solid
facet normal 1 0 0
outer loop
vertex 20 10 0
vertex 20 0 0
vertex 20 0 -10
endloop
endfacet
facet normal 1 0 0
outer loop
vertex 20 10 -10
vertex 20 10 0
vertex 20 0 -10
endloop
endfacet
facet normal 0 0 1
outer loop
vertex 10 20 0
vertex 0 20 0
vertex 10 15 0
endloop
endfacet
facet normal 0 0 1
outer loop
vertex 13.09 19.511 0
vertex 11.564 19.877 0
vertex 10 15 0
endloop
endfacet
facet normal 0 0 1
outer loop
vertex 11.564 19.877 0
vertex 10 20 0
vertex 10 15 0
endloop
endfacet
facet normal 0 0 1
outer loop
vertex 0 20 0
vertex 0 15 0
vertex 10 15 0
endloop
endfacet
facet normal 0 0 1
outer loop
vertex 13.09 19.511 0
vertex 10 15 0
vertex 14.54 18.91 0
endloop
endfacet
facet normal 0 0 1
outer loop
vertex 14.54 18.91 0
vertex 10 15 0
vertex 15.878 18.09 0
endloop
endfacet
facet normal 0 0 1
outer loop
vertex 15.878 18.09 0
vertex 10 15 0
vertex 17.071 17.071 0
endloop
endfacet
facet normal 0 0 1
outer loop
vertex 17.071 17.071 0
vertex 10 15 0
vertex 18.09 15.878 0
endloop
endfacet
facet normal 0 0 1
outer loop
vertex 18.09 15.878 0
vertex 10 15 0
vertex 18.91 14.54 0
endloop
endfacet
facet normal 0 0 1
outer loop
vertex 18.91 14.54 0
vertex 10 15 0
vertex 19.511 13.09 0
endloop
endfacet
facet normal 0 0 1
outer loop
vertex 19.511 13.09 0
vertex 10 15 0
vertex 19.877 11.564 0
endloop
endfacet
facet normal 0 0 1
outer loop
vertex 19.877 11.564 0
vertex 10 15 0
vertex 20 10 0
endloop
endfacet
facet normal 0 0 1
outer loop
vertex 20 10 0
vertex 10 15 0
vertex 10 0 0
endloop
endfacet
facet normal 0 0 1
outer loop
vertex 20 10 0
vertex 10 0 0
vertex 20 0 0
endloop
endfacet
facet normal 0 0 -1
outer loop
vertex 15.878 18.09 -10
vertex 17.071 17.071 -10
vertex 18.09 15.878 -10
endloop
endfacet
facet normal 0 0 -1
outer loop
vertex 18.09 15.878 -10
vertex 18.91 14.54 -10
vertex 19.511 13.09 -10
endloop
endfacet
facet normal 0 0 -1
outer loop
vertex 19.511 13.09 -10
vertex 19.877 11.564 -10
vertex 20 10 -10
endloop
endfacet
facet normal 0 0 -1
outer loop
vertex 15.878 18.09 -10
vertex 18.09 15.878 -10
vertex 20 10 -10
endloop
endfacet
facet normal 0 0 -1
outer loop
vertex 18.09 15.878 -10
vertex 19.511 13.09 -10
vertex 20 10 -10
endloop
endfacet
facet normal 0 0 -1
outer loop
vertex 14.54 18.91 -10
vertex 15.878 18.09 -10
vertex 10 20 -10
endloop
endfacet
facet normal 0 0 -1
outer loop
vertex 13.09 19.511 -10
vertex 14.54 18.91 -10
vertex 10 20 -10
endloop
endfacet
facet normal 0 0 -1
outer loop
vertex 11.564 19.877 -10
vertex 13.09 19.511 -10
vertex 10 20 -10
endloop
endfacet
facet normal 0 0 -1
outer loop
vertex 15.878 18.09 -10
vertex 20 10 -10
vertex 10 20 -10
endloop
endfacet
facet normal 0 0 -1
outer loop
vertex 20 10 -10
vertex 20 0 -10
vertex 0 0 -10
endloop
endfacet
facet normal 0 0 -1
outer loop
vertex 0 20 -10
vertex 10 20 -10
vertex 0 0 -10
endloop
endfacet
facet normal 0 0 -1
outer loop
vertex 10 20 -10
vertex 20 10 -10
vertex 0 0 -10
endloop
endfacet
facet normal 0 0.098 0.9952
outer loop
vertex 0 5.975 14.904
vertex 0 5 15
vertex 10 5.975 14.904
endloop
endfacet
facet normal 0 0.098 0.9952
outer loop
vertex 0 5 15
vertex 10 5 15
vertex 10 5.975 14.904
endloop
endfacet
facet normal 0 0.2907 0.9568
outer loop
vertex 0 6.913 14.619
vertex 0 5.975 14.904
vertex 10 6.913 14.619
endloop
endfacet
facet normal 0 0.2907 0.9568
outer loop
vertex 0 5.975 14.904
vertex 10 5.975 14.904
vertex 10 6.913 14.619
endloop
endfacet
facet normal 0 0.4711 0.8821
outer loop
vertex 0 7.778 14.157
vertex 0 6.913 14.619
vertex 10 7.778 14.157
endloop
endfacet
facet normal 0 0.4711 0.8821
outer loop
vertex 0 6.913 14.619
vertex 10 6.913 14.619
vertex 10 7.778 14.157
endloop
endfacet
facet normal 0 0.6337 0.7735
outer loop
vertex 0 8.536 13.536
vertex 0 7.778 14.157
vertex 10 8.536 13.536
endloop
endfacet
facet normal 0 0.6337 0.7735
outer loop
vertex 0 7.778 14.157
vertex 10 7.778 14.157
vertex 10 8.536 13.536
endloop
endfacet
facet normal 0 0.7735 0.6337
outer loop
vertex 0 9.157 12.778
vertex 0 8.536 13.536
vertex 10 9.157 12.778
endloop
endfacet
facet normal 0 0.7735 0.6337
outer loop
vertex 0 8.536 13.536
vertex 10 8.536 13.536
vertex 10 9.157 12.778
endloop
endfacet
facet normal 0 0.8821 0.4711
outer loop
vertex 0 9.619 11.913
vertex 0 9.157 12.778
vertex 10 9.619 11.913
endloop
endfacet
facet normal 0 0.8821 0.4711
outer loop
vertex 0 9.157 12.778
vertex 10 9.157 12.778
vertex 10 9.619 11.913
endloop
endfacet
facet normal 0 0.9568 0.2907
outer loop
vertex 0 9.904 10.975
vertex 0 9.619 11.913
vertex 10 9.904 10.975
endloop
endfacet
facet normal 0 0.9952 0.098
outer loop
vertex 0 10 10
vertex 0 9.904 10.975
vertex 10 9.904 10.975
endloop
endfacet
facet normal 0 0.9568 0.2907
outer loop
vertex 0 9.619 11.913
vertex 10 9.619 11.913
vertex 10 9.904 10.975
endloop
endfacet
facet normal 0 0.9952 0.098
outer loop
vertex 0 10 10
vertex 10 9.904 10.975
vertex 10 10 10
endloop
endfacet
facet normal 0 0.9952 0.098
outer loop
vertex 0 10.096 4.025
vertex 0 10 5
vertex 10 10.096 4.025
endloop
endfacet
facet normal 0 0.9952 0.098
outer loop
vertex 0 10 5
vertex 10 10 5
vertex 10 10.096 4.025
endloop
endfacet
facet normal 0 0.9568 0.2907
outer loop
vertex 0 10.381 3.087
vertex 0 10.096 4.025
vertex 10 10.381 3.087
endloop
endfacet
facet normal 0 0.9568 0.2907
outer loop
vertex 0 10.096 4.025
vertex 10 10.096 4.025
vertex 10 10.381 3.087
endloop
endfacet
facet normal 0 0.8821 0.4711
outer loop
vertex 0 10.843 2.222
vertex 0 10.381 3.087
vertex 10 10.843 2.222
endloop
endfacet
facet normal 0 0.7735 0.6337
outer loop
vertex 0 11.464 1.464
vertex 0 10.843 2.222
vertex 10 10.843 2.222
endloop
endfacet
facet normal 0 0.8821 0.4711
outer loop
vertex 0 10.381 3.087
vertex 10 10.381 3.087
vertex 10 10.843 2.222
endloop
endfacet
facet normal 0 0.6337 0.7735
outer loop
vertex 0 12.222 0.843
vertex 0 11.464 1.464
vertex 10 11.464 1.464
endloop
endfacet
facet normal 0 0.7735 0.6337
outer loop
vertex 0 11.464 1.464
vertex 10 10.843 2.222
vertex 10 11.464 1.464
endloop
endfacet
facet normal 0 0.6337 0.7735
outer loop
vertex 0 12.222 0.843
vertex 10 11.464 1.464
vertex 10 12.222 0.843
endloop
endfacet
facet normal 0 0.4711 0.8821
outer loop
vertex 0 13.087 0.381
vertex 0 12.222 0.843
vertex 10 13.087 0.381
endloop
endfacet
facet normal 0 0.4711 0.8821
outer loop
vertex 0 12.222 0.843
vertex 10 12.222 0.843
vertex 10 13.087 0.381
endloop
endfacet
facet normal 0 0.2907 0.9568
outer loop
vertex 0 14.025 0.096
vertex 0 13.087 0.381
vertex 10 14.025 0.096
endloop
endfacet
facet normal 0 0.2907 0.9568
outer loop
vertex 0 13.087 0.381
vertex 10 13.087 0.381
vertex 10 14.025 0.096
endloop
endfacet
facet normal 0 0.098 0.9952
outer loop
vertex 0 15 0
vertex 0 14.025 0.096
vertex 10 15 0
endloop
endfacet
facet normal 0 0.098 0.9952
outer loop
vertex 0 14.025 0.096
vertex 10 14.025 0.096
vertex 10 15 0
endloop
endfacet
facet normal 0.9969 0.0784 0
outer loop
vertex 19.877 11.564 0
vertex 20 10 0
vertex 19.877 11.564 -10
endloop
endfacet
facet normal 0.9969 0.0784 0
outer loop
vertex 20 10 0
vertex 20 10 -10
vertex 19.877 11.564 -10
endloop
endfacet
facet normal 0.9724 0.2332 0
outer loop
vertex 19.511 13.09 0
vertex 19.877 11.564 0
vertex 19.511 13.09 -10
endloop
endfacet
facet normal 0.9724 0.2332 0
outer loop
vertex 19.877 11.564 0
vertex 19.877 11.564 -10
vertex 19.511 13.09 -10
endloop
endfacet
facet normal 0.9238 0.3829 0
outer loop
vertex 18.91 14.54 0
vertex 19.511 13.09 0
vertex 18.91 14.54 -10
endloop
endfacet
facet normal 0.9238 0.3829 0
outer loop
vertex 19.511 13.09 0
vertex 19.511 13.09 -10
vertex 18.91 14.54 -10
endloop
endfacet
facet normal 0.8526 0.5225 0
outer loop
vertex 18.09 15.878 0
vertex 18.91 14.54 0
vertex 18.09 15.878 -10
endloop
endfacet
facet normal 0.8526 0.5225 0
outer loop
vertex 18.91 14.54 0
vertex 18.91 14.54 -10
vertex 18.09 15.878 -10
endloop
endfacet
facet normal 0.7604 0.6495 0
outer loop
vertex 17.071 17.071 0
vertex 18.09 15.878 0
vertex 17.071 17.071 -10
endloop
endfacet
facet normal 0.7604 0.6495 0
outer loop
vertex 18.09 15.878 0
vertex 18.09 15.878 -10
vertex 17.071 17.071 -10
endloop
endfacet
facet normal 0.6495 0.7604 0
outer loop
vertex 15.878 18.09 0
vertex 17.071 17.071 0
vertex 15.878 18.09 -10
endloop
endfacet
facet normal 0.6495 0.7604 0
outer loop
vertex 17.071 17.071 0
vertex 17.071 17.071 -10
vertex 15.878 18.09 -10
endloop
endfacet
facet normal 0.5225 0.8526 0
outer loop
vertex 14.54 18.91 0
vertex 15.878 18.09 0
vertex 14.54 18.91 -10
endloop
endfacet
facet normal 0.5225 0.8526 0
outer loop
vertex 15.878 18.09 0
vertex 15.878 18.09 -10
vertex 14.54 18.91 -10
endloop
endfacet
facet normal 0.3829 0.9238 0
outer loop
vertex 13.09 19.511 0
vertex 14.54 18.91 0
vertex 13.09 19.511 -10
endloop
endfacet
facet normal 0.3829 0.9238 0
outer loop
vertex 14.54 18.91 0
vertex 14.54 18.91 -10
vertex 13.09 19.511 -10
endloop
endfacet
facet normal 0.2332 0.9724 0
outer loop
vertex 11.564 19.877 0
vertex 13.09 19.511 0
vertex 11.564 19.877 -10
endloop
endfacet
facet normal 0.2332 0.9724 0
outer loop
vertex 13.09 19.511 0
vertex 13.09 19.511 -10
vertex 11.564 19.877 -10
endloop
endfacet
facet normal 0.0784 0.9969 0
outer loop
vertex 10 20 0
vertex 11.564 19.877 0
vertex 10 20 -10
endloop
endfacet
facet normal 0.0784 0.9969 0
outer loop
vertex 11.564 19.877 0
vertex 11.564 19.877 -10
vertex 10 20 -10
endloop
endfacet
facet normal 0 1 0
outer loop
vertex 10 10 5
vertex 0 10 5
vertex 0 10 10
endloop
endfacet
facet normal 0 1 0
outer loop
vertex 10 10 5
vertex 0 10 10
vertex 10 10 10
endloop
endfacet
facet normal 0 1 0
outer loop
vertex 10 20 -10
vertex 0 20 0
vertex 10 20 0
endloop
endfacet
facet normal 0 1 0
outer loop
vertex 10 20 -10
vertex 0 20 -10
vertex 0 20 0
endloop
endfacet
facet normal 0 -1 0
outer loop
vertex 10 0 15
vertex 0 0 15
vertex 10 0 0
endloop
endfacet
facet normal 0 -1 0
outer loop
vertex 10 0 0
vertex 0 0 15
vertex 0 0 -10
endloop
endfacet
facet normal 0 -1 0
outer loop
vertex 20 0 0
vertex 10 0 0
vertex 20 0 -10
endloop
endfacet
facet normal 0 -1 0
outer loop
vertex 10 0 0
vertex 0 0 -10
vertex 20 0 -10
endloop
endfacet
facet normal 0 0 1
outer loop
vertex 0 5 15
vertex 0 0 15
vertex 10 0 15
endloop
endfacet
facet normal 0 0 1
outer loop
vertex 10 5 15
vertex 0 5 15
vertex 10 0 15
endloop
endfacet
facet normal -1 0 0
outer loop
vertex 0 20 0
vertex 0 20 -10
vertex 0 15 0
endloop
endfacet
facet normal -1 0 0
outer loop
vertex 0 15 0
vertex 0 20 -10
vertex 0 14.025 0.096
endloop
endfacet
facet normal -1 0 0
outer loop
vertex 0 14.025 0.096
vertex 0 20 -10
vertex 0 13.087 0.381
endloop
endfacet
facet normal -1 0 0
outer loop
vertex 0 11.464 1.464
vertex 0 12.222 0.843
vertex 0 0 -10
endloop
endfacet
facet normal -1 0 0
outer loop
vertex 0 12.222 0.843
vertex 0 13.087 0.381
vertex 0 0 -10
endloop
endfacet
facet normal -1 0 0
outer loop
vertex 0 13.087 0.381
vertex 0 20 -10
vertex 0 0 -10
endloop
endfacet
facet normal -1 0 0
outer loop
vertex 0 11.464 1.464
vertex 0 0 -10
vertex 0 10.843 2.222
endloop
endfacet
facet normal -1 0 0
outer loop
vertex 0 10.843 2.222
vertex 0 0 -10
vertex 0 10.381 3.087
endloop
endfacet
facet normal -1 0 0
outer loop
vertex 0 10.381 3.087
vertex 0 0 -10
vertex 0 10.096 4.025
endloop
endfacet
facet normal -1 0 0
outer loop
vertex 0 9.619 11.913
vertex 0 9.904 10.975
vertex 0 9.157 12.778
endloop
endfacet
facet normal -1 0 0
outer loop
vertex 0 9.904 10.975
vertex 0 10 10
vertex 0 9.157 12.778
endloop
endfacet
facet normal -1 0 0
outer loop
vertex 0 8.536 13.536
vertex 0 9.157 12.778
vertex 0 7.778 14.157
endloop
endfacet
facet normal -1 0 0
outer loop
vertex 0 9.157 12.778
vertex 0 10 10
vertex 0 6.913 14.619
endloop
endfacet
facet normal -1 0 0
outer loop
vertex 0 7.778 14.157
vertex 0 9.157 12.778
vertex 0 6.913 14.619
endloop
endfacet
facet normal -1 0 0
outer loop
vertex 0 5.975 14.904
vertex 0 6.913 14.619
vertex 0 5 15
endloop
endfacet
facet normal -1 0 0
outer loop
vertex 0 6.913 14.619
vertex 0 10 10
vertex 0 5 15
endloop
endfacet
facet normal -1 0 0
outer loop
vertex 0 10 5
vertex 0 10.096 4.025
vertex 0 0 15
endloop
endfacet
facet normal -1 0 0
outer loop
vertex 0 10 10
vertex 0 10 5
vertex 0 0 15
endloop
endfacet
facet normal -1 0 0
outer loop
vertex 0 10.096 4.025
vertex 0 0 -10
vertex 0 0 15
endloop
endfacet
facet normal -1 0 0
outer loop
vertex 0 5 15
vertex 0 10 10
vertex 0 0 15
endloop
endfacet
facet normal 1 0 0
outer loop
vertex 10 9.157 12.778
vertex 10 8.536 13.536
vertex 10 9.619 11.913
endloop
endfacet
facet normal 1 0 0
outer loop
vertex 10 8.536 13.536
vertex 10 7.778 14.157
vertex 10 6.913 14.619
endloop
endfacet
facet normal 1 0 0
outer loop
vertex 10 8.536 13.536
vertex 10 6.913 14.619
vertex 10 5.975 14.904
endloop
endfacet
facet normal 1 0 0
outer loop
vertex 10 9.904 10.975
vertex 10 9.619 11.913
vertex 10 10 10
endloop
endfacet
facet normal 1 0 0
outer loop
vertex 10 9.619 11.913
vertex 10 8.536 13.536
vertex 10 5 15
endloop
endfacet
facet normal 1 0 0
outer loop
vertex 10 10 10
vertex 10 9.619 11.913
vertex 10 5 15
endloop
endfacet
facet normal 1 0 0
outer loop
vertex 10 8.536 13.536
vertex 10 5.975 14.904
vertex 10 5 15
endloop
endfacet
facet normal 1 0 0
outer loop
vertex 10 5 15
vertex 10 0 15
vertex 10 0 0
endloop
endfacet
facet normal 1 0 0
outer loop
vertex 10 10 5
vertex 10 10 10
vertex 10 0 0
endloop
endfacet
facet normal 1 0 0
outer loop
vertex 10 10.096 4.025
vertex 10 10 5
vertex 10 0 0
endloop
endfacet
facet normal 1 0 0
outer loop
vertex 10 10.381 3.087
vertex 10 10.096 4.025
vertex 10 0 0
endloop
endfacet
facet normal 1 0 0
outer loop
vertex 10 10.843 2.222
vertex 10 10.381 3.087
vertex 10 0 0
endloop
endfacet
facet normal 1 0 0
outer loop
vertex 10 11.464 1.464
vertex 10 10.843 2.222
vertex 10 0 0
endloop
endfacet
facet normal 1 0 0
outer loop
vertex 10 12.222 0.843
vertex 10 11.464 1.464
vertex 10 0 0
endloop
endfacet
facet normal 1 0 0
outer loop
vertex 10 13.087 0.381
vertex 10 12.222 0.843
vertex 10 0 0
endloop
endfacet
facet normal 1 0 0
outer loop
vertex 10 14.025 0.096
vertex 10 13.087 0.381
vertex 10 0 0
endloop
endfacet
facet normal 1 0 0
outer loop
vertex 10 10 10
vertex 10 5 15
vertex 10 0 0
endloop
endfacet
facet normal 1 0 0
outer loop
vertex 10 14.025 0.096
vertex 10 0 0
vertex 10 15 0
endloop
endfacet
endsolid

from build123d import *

# Parameters (mm, degrees)
SKETCH_1_W      = 10
SKETCH_1_H      = 15
EXTRUDE_1_DEPTH = 10
EXTRUDE_2_DEPTH = 20
FILLET_1_R      = 5
FILLET_2_R      = 10


with BuildPart() as part:
    # 草圖1 → 填料-伸長1 (new body)
    with BuildSketch(Plane(origin=(0, 0, 0), x_dir=(1, 0, 0), z_dir=(0, 1, 0))):
        with Locations((5, -7.5)):
            Rectangle(SKETCH_1_W, SKETCH_1_H)
    extrude(amount=EXTRUDE_1_DEPTH)

    # 草圖1<3> → 填料-伸長2 (add)
    with BuildSketch(Plane(origin=(0, 0, 0), x_dir=(1, 0, 0), z_dir=(0, 1, 0))):
        Polygon((0, 10), (0, 0), (10, 0), (20, 0), (20, 10), align=None)
    extrude(amount=EXTRUDE_2_DEPTH)

    # 圓角1
    fillet_1_edges = [part.edges().sort_by_distance(p)[0] for p in [
        (5, 10, 15),
        (5, 10, 0),
    ]]
    fillet(fillet_1_edges, radius=FILLET_1_R)

    # 圓角2
    fillet_2_edges = [part.edges().sort_by_distance(p)[0] for p in [
        (20, 20, -5),
    ]]
    fillet(fillet_2_edges, radius=FILLET_2_R)


solid = part.part
